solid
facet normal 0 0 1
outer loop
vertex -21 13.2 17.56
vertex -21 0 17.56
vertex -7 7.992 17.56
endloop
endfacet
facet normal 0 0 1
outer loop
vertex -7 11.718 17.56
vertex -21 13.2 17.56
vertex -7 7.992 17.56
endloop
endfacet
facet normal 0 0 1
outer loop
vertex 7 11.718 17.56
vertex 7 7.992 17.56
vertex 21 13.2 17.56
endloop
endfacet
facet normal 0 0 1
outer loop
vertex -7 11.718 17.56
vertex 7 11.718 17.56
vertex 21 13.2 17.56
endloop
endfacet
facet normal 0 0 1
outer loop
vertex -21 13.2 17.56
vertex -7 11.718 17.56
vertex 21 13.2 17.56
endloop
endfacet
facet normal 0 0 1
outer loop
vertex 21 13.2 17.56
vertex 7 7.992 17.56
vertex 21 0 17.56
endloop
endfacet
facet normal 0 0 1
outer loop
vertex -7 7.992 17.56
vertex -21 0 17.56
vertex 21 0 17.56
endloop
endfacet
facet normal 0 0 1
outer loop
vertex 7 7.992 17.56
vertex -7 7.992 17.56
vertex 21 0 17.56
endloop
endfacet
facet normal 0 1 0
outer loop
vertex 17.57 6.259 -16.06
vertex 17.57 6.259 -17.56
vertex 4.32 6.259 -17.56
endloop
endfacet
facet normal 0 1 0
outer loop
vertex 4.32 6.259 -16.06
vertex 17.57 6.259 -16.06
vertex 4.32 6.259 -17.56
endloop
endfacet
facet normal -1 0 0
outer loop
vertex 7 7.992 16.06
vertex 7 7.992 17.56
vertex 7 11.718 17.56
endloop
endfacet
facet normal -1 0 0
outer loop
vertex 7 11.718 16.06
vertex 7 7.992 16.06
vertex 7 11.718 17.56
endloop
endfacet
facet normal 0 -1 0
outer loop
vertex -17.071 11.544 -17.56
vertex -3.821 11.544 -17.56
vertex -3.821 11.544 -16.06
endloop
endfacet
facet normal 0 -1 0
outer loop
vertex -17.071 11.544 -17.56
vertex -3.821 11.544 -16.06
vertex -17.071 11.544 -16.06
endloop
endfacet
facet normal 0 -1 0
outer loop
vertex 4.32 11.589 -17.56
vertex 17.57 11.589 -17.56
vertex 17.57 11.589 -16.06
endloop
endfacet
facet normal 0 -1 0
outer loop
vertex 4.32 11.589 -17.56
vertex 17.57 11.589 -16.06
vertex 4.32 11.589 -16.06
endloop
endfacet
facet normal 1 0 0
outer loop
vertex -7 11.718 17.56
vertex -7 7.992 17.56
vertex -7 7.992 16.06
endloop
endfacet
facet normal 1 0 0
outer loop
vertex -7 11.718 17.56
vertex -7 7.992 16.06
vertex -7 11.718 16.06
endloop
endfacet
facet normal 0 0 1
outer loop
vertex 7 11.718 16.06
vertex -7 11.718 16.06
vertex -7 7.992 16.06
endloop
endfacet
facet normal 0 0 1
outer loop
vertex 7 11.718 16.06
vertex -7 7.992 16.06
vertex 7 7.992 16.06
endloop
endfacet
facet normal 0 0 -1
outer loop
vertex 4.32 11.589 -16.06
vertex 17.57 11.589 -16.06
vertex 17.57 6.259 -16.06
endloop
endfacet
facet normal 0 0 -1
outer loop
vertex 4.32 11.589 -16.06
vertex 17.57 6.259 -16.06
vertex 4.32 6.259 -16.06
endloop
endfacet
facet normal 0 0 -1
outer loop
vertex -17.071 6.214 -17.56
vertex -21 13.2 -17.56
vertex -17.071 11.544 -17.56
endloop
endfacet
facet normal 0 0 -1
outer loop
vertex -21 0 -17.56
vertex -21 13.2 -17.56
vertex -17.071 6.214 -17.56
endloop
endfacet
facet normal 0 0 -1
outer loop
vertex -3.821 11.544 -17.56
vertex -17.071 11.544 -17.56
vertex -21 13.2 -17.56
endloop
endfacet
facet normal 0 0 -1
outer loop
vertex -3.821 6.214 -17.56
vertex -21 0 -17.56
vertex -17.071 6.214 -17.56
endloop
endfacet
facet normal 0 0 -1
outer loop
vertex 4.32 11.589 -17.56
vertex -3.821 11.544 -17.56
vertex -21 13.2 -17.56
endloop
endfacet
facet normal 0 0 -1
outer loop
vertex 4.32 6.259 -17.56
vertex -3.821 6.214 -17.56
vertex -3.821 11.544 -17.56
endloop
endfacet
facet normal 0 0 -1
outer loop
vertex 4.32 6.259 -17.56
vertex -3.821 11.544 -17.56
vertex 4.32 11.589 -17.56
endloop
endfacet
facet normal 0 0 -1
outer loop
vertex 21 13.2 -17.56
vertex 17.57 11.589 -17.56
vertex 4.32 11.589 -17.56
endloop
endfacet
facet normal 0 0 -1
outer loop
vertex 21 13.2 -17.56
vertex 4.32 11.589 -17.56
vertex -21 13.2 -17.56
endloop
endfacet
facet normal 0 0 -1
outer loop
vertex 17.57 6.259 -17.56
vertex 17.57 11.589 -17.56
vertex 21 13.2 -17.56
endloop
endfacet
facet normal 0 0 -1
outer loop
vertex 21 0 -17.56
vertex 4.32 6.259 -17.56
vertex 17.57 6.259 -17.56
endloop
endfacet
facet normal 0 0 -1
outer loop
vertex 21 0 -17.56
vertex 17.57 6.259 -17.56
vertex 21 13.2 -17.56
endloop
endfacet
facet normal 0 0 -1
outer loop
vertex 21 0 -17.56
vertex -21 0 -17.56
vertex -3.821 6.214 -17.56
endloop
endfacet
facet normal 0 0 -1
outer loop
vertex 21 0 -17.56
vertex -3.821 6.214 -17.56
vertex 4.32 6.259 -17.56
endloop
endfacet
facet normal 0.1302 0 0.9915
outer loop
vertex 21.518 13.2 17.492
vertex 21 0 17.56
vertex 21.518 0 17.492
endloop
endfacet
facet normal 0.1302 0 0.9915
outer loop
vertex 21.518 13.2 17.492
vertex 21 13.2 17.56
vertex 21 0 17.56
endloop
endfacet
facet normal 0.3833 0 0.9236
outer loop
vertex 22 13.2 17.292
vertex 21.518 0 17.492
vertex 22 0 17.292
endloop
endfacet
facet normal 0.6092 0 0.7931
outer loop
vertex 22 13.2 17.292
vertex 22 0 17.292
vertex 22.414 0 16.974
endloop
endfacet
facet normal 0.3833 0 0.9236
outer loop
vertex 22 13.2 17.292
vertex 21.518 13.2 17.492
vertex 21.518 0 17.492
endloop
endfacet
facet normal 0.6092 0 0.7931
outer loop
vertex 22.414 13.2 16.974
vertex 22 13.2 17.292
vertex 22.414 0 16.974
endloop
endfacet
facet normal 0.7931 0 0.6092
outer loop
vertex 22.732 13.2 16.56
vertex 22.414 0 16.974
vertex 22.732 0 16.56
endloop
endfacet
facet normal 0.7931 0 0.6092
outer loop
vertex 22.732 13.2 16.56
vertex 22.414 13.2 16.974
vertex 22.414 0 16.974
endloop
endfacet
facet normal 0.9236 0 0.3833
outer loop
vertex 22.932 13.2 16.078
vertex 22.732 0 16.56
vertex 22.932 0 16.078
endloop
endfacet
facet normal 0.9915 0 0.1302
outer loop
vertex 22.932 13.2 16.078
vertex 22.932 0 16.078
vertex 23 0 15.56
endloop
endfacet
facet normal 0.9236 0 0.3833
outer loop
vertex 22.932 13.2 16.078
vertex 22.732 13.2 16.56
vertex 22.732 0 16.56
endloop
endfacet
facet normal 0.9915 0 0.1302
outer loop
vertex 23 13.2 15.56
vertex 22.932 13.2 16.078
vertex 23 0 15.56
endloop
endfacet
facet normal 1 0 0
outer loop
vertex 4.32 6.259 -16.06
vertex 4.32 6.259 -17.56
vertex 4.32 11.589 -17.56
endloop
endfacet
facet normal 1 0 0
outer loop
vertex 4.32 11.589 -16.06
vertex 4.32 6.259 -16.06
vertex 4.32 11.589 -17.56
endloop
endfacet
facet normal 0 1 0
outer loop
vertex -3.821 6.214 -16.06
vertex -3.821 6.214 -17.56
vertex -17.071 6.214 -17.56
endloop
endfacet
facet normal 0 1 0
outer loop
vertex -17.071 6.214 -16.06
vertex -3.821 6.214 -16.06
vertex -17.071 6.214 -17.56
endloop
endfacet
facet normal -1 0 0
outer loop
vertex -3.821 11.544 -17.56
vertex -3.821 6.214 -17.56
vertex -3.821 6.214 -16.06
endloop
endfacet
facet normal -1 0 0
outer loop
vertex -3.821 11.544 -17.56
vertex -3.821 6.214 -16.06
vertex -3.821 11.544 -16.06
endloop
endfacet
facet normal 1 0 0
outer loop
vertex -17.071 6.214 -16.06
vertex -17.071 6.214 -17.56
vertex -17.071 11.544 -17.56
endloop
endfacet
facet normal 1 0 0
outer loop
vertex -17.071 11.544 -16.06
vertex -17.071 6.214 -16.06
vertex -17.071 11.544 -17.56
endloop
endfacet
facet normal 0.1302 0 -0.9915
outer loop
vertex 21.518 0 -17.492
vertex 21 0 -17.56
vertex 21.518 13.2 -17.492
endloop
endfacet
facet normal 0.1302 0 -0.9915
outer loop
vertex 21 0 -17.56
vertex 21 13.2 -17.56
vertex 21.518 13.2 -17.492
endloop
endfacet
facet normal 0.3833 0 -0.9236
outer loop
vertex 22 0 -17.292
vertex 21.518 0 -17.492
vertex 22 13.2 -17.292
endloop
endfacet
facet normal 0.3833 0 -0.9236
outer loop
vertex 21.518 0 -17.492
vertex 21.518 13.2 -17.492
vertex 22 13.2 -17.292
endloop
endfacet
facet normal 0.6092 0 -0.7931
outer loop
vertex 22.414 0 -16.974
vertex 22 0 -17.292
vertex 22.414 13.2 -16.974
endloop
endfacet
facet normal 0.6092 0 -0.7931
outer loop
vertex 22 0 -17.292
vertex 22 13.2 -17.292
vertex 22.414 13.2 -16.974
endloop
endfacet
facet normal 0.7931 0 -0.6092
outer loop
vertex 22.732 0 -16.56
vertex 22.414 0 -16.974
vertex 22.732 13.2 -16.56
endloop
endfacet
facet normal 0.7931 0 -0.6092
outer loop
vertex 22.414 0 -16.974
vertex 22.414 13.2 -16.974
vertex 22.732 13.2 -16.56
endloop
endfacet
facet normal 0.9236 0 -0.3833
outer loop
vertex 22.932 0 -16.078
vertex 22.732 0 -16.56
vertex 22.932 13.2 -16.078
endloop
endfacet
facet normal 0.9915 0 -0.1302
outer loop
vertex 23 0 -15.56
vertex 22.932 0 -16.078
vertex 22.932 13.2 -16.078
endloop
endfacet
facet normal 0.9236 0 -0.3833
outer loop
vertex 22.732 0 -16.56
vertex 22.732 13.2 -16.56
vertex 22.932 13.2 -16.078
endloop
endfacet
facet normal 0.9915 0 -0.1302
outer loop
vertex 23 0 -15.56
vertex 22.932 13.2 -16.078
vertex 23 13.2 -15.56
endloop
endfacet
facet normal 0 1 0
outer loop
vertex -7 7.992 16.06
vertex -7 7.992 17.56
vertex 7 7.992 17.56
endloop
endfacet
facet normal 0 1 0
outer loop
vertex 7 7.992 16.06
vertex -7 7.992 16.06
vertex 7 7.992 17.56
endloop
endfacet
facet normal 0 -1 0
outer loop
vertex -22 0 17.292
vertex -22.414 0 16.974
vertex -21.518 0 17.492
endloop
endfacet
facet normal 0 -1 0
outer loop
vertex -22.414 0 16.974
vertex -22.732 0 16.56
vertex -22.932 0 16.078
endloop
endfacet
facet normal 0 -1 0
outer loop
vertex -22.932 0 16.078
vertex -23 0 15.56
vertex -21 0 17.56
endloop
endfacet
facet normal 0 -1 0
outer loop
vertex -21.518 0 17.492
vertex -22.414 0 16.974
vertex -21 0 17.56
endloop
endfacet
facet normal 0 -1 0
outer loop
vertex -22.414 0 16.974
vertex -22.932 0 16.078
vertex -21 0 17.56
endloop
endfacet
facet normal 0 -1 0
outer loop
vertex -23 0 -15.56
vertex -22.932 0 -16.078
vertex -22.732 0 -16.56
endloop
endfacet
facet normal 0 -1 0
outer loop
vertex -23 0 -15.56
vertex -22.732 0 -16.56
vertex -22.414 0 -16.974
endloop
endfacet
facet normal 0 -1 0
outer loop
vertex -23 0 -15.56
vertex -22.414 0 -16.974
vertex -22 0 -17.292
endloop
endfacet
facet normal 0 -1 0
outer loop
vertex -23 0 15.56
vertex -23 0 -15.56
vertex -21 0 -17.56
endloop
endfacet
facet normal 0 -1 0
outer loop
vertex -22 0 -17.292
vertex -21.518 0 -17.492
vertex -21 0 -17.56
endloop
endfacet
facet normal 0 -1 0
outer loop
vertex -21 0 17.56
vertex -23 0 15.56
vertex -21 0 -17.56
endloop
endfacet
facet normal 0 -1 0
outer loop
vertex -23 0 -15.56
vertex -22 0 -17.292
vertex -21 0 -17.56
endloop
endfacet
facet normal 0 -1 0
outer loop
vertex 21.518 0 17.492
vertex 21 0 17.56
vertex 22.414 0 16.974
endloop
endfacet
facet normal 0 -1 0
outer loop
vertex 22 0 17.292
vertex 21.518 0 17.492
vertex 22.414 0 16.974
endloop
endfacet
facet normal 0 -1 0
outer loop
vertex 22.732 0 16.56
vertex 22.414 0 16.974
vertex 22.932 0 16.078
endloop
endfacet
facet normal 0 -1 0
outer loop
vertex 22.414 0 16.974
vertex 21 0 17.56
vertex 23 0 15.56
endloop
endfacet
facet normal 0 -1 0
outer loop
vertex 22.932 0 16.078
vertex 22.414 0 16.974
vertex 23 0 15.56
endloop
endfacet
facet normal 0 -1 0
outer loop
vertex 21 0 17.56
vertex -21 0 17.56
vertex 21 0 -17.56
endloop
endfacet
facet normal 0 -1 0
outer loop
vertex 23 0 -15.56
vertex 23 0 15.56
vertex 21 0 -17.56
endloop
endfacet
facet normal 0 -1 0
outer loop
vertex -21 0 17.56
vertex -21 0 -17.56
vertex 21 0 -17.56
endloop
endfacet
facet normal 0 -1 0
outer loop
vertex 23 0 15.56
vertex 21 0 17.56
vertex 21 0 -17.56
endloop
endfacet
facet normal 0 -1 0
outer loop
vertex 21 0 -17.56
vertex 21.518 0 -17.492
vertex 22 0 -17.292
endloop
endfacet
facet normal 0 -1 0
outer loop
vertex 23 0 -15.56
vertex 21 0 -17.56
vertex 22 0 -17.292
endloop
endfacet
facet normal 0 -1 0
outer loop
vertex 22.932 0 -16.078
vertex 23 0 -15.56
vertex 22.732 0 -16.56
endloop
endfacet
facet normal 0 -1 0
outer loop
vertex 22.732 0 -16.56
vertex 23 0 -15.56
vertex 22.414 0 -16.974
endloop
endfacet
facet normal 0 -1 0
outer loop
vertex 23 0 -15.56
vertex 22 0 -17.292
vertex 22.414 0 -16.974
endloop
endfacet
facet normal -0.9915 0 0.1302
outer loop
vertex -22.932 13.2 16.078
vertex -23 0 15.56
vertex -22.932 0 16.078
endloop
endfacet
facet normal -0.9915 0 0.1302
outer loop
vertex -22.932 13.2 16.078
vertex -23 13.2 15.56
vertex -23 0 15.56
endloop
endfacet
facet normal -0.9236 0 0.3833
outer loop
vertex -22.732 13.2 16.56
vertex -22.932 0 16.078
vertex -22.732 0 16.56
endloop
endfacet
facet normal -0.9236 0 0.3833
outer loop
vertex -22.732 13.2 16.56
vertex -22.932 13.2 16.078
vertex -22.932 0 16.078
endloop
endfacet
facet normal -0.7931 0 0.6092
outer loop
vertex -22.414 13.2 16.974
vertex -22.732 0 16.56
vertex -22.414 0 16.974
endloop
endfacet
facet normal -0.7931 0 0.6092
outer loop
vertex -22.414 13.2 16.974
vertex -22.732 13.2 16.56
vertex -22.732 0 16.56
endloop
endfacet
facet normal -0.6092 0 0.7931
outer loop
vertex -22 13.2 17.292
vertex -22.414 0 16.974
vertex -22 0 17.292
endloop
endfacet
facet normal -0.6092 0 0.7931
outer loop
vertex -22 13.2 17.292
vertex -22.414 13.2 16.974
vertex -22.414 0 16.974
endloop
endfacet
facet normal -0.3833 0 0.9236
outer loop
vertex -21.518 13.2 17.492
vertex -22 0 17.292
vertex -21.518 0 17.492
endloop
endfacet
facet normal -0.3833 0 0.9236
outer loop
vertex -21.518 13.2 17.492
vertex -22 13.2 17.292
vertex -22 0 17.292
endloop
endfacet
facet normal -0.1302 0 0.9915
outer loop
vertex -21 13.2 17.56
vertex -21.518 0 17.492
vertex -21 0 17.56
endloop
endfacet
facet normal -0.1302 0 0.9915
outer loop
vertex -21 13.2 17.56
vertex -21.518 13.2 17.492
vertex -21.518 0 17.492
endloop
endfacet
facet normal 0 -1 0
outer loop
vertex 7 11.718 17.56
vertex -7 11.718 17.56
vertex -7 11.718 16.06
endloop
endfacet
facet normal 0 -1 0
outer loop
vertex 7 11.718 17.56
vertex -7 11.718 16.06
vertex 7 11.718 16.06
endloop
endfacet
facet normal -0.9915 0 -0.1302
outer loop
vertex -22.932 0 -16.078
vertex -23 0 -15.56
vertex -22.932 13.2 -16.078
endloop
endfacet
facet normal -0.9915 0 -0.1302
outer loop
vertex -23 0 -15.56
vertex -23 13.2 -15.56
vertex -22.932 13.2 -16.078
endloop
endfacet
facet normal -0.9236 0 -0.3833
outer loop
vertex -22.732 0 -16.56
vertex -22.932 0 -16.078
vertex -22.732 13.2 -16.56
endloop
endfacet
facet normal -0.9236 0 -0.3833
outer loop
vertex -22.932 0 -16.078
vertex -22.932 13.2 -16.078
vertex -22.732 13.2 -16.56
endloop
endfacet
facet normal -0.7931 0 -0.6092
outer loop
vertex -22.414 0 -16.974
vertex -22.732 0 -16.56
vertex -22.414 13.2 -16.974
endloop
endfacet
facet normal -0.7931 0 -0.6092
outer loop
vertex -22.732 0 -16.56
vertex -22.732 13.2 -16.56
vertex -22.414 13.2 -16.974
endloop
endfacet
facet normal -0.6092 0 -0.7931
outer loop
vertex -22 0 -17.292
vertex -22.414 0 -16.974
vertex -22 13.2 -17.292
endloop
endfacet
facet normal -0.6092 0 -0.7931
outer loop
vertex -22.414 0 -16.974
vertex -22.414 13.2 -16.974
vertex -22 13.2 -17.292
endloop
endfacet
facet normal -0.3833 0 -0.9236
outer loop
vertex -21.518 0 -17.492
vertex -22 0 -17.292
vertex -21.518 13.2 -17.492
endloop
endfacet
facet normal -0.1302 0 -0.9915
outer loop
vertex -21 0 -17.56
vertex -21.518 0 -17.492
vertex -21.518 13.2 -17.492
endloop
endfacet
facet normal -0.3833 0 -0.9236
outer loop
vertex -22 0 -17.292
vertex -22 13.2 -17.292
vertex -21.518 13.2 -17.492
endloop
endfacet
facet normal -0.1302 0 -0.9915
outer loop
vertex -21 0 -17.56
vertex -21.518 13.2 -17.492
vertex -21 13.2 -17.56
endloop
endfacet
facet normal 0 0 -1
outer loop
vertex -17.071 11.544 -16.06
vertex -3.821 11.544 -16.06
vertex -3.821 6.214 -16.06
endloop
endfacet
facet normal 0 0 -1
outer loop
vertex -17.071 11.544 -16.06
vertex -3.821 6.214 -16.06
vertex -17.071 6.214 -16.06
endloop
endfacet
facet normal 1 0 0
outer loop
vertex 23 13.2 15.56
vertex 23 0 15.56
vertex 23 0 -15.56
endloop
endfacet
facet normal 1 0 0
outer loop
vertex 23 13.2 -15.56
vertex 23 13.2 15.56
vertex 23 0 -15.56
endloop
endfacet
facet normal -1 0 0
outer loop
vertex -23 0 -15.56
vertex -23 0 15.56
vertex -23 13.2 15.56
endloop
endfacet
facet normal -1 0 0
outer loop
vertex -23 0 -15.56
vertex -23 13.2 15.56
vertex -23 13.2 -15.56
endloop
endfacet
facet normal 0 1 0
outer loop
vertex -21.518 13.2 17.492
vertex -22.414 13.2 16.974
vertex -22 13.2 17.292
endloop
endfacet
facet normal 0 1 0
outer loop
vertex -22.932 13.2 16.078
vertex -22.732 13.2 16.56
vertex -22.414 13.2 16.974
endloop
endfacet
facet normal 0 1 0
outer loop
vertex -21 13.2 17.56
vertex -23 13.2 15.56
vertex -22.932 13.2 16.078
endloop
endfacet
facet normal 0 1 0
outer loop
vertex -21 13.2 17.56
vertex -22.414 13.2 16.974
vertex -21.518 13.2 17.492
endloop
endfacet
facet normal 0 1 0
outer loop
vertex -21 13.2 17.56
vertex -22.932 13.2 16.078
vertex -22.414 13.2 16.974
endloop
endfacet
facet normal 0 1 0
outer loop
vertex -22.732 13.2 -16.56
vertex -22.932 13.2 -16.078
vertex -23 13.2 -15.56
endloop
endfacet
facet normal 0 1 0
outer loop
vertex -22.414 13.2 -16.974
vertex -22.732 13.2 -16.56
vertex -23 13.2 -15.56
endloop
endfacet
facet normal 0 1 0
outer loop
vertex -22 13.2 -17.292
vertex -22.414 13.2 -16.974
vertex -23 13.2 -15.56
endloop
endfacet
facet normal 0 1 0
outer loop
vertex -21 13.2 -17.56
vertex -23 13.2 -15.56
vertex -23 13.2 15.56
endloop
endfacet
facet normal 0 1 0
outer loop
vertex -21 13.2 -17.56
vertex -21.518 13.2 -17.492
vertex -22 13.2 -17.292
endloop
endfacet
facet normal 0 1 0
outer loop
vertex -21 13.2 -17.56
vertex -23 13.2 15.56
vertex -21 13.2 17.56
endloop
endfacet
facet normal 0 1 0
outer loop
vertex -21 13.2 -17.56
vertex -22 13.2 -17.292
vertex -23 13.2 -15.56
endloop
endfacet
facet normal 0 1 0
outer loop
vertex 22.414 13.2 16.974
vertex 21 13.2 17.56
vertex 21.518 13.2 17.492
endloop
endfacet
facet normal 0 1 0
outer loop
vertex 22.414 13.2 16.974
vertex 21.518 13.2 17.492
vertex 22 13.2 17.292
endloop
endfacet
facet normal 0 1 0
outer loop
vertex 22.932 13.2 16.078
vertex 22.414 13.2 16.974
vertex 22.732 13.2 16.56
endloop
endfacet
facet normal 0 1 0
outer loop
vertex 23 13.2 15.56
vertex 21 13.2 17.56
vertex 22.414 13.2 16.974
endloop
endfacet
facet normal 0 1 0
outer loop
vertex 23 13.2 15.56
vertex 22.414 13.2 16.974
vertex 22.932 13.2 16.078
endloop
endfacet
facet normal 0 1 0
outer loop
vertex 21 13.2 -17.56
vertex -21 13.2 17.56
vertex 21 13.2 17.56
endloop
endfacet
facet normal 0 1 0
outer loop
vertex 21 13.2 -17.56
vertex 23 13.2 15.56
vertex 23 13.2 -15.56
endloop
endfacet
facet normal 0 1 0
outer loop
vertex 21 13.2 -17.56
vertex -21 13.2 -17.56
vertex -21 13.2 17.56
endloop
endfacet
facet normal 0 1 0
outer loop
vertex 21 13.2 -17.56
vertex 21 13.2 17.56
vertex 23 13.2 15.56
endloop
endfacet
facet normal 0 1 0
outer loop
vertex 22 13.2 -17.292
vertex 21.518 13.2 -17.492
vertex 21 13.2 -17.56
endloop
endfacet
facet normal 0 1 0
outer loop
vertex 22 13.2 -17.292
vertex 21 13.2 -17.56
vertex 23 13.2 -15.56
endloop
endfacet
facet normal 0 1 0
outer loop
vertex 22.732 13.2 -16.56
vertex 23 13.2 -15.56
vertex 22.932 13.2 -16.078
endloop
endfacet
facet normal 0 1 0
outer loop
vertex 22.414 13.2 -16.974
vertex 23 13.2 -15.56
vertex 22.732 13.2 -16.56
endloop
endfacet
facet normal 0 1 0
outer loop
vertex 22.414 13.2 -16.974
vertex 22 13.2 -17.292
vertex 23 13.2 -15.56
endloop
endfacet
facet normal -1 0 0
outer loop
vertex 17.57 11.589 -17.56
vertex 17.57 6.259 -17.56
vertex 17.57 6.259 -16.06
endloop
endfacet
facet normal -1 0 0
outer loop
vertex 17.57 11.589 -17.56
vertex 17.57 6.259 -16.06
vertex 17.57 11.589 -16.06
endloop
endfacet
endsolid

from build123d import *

# Parameters (mm, degrees)
SKETCH1_W           = 46
SKETCH1_H           = 35.12
BOSS_EXTRUDE1_DEPTH = 13.2
SKETCH2_W           = 13.25
SKETCH2_H           = 5.33
CUT_EXTRUDE1_DEPTH  = 1.5
SKETCH5_W           = 13.25
SKETCH5_H           = 5.33
CUT_EXTRUDE2_DEPTH  = 1.5
SKETCH6_W           = 14
SKETCH6_H           = 3.726009738
CUT_EXTRUDE3_DEPTH  = 1.5
FILLET1_R           = 2


with BuildPart() as part:
    # Sketch1 → Boss-Extrude1 (new body)
    with BuildSketch(Plane(origin=(0, 0, 0), x_dir=(1, 0, 0), z_dir=(0, 1, 0))):
        Rectangle(SKETCH1_W, SKETCH1_H)
    extrude(amount=BOSS_EXTRUDE1_DEPTH)

    # Sketch2 → Cut-Extrude1 (cut)
    with BuildSketch(Plane(origin=(0, 0, -17.56), x_dir=(-1, 0, 0), z_dir=(0, 0, -1))):
        with Locations((-10.945153605, 8.923987955)):
            Rectangle(SKETCH2_W, SKETCH2_H)
    extrude(amount=-CUT_EXTRUDE1_DEPTH, mode=Mode.SUBTRACT)

    # Sketch5 → Cut-Extrude2 (cut)
    with BuildSketch(Plane(origin=(0, 0, -17.56), x_dir=(-1, 0, 0), z_dir=(0, 0, -1))):
        with Locations((10.446134444, 8.878725803)):
            Rectangle(SKETCH5_W, SKETCH5_H)
    extrude(amount=-CUT_EXTRUDE2_DEPTH, mode=Mode.SUBTRACT)

    # Sketch6 → Cut-Extrude3 (cut)
    with BuildSketch(Plane.XY.offset(17.56)):
        with Locations((0, 9.85493568)):
            Rectangle(SKETCH6_W, SKETCH6_H)
    extrude(amount=-CUT_EXTRUDE3_DEPTH, mode=Mode.SUBTRACT)

    # Fillet1
    fillet1_edges = [part.edges().sort_by_distance(p)[0] for p in [
        (-23, 6.6, -17.56),
        (23, 6.6, -17.56),
        (23, 6.6, 17.56),
        (-23, 6.6, 17.56),
    ]]
    fillet(fillet1_edges, radius=FILLET1_R)


solid = part.part
